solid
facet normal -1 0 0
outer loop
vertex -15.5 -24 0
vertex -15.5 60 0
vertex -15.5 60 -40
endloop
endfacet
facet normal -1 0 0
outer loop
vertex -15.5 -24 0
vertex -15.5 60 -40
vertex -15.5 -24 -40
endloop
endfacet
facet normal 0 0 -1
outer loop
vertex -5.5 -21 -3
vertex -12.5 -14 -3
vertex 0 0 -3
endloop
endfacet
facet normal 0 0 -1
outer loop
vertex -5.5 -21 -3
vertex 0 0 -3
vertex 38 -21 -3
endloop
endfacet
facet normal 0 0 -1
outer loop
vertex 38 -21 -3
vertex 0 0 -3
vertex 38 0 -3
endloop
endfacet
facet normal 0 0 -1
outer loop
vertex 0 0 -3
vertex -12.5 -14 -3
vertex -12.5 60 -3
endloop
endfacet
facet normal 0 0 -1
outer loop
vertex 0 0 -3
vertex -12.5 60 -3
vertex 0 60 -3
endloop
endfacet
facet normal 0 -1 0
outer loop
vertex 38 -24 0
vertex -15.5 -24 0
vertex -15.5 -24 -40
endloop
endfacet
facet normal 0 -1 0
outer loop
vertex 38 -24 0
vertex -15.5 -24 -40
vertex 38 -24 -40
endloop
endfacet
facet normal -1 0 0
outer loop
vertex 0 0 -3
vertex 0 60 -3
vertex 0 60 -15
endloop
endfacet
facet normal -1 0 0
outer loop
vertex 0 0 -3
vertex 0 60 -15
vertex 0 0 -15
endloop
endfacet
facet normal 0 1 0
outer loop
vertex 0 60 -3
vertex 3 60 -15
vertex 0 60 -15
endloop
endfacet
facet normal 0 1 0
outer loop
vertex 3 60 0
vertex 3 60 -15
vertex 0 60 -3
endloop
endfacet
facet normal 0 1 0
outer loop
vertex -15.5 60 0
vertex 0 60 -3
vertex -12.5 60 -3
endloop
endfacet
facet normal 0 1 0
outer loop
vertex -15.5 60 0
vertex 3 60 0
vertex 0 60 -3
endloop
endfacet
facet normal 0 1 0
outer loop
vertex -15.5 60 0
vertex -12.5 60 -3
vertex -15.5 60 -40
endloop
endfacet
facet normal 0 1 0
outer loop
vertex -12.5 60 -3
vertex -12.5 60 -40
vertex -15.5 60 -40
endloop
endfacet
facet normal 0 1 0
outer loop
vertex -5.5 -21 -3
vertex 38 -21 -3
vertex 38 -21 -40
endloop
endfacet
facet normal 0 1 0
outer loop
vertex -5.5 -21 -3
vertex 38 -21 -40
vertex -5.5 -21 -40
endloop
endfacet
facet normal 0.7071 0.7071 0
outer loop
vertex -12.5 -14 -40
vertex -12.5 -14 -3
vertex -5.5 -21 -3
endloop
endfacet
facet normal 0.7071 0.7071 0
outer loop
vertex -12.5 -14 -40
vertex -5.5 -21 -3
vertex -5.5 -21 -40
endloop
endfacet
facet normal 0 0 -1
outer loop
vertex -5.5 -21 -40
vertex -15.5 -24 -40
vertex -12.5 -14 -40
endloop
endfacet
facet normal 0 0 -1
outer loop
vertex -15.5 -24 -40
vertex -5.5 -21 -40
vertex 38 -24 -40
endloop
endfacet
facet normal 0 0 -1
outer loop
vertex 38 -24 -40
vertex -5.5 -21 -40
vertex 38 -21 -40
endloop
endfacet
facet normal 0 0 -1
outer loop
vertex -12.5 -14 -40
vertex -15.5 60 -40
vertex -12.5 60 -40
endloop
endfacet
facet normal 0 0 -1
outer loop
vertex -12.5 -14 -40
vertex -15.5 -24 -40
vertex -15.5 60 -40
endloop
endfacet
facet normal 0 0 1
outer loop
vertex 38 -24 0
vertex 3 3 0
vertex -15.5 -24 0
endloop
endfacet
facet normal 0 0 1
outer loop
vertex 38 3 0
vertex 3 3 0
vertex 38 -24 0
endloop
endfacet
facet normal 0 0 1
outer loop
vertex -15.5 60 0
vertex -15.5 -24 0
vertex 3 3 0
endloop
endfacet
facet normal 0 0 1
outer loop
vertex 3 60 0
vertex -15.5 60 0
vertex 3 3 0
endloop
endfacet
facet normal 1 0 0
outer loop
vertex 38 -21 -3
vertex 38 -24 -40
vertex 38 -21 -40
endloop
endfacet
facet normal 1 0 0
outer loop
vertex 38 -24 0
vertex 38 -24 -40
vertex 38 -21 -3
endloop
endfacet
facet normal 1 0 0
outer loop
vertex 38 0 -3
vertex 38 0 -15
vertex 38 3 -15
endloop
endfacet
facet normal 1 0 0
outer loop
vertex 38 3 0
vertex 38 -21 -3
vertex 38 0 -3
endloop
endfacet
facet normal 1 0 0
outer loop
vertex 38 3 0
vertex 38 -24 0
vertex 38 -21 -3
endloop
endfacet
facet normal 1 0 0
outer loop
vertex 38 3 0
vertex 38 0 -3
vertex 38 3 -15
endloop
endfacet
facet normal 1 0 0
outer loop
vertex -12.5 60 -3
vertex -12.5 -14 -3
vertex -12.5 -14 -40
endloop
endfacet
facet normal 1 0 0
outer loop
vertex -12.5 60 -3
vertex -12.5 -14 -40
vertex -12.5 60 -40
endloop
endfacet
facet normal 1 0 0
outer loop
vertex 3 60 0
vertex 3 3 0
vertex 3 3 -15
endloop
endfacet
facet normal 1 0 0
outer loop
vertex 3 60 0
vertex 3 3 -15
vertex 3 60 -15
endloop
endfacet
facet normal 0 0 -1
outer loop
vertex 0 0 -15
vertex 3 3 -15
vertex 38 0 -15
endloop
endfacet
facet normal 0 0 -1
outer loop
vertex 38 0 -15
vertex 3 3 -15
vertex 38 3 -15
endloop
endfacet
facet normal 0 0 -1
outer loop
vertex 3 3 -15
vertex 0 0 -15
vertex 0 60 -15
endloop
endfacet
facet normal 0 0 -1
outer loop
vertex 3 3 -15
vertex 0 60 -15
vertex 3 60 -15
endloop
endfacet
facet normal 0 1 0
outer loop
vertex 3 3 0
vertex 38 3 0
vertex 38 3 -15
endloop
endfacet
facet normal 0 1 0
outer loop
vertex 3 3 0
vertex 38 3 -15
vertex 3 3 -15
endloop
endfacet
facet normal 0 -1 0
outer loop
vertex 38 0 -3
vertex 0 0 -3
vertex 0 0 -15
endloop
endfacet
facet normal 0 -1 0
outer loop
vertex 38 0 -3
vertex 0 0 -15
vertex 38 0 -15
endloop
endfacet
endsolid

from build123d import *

# Parameters (mm, degrees)
F2_DEPTH = 3
F3_DEPTH = 40
F4_DEPTH = 15
F5_SIZE  = 7


with BuildPart() as f2:
    # F1 (on Top) → F2 (new body)
    with BuildSketch(Plane.XY):
        Polygon((0, 60), (-12.5, 60), (-12.5, -21), (38, -21), (38, 0), (0, 0), align=None)
    extrude(amount=-F2_DEPTH)

    # F1 (on Top) → F3 (join)
    with BuildSketch(Plane.XY):
        Polygon((-12.5, -21), (-12.5, 60), (-15.5, 60), (-15.5, -24), (38, -24), (38, -21), align=None)
    extrude(amount=-F3_DEPTH)

    # F1 (on Top) → F4 (join)
    with BuildSketch(Plane.XY):
        Polygon((3, 60), (0, 60), (0, 0), (38, 0), (38, 3), (3, 3), align=None)
    extrude(amount=-F4_DEPTH)

    # F5
    f5_edges = [f2.edges().sort_by_distance(p)[0] for p in [
        (-12.5, -21, -21.5),
    ]]
    chamfer(f5_edges, length=F5_SIZE)


solid = f2.part
